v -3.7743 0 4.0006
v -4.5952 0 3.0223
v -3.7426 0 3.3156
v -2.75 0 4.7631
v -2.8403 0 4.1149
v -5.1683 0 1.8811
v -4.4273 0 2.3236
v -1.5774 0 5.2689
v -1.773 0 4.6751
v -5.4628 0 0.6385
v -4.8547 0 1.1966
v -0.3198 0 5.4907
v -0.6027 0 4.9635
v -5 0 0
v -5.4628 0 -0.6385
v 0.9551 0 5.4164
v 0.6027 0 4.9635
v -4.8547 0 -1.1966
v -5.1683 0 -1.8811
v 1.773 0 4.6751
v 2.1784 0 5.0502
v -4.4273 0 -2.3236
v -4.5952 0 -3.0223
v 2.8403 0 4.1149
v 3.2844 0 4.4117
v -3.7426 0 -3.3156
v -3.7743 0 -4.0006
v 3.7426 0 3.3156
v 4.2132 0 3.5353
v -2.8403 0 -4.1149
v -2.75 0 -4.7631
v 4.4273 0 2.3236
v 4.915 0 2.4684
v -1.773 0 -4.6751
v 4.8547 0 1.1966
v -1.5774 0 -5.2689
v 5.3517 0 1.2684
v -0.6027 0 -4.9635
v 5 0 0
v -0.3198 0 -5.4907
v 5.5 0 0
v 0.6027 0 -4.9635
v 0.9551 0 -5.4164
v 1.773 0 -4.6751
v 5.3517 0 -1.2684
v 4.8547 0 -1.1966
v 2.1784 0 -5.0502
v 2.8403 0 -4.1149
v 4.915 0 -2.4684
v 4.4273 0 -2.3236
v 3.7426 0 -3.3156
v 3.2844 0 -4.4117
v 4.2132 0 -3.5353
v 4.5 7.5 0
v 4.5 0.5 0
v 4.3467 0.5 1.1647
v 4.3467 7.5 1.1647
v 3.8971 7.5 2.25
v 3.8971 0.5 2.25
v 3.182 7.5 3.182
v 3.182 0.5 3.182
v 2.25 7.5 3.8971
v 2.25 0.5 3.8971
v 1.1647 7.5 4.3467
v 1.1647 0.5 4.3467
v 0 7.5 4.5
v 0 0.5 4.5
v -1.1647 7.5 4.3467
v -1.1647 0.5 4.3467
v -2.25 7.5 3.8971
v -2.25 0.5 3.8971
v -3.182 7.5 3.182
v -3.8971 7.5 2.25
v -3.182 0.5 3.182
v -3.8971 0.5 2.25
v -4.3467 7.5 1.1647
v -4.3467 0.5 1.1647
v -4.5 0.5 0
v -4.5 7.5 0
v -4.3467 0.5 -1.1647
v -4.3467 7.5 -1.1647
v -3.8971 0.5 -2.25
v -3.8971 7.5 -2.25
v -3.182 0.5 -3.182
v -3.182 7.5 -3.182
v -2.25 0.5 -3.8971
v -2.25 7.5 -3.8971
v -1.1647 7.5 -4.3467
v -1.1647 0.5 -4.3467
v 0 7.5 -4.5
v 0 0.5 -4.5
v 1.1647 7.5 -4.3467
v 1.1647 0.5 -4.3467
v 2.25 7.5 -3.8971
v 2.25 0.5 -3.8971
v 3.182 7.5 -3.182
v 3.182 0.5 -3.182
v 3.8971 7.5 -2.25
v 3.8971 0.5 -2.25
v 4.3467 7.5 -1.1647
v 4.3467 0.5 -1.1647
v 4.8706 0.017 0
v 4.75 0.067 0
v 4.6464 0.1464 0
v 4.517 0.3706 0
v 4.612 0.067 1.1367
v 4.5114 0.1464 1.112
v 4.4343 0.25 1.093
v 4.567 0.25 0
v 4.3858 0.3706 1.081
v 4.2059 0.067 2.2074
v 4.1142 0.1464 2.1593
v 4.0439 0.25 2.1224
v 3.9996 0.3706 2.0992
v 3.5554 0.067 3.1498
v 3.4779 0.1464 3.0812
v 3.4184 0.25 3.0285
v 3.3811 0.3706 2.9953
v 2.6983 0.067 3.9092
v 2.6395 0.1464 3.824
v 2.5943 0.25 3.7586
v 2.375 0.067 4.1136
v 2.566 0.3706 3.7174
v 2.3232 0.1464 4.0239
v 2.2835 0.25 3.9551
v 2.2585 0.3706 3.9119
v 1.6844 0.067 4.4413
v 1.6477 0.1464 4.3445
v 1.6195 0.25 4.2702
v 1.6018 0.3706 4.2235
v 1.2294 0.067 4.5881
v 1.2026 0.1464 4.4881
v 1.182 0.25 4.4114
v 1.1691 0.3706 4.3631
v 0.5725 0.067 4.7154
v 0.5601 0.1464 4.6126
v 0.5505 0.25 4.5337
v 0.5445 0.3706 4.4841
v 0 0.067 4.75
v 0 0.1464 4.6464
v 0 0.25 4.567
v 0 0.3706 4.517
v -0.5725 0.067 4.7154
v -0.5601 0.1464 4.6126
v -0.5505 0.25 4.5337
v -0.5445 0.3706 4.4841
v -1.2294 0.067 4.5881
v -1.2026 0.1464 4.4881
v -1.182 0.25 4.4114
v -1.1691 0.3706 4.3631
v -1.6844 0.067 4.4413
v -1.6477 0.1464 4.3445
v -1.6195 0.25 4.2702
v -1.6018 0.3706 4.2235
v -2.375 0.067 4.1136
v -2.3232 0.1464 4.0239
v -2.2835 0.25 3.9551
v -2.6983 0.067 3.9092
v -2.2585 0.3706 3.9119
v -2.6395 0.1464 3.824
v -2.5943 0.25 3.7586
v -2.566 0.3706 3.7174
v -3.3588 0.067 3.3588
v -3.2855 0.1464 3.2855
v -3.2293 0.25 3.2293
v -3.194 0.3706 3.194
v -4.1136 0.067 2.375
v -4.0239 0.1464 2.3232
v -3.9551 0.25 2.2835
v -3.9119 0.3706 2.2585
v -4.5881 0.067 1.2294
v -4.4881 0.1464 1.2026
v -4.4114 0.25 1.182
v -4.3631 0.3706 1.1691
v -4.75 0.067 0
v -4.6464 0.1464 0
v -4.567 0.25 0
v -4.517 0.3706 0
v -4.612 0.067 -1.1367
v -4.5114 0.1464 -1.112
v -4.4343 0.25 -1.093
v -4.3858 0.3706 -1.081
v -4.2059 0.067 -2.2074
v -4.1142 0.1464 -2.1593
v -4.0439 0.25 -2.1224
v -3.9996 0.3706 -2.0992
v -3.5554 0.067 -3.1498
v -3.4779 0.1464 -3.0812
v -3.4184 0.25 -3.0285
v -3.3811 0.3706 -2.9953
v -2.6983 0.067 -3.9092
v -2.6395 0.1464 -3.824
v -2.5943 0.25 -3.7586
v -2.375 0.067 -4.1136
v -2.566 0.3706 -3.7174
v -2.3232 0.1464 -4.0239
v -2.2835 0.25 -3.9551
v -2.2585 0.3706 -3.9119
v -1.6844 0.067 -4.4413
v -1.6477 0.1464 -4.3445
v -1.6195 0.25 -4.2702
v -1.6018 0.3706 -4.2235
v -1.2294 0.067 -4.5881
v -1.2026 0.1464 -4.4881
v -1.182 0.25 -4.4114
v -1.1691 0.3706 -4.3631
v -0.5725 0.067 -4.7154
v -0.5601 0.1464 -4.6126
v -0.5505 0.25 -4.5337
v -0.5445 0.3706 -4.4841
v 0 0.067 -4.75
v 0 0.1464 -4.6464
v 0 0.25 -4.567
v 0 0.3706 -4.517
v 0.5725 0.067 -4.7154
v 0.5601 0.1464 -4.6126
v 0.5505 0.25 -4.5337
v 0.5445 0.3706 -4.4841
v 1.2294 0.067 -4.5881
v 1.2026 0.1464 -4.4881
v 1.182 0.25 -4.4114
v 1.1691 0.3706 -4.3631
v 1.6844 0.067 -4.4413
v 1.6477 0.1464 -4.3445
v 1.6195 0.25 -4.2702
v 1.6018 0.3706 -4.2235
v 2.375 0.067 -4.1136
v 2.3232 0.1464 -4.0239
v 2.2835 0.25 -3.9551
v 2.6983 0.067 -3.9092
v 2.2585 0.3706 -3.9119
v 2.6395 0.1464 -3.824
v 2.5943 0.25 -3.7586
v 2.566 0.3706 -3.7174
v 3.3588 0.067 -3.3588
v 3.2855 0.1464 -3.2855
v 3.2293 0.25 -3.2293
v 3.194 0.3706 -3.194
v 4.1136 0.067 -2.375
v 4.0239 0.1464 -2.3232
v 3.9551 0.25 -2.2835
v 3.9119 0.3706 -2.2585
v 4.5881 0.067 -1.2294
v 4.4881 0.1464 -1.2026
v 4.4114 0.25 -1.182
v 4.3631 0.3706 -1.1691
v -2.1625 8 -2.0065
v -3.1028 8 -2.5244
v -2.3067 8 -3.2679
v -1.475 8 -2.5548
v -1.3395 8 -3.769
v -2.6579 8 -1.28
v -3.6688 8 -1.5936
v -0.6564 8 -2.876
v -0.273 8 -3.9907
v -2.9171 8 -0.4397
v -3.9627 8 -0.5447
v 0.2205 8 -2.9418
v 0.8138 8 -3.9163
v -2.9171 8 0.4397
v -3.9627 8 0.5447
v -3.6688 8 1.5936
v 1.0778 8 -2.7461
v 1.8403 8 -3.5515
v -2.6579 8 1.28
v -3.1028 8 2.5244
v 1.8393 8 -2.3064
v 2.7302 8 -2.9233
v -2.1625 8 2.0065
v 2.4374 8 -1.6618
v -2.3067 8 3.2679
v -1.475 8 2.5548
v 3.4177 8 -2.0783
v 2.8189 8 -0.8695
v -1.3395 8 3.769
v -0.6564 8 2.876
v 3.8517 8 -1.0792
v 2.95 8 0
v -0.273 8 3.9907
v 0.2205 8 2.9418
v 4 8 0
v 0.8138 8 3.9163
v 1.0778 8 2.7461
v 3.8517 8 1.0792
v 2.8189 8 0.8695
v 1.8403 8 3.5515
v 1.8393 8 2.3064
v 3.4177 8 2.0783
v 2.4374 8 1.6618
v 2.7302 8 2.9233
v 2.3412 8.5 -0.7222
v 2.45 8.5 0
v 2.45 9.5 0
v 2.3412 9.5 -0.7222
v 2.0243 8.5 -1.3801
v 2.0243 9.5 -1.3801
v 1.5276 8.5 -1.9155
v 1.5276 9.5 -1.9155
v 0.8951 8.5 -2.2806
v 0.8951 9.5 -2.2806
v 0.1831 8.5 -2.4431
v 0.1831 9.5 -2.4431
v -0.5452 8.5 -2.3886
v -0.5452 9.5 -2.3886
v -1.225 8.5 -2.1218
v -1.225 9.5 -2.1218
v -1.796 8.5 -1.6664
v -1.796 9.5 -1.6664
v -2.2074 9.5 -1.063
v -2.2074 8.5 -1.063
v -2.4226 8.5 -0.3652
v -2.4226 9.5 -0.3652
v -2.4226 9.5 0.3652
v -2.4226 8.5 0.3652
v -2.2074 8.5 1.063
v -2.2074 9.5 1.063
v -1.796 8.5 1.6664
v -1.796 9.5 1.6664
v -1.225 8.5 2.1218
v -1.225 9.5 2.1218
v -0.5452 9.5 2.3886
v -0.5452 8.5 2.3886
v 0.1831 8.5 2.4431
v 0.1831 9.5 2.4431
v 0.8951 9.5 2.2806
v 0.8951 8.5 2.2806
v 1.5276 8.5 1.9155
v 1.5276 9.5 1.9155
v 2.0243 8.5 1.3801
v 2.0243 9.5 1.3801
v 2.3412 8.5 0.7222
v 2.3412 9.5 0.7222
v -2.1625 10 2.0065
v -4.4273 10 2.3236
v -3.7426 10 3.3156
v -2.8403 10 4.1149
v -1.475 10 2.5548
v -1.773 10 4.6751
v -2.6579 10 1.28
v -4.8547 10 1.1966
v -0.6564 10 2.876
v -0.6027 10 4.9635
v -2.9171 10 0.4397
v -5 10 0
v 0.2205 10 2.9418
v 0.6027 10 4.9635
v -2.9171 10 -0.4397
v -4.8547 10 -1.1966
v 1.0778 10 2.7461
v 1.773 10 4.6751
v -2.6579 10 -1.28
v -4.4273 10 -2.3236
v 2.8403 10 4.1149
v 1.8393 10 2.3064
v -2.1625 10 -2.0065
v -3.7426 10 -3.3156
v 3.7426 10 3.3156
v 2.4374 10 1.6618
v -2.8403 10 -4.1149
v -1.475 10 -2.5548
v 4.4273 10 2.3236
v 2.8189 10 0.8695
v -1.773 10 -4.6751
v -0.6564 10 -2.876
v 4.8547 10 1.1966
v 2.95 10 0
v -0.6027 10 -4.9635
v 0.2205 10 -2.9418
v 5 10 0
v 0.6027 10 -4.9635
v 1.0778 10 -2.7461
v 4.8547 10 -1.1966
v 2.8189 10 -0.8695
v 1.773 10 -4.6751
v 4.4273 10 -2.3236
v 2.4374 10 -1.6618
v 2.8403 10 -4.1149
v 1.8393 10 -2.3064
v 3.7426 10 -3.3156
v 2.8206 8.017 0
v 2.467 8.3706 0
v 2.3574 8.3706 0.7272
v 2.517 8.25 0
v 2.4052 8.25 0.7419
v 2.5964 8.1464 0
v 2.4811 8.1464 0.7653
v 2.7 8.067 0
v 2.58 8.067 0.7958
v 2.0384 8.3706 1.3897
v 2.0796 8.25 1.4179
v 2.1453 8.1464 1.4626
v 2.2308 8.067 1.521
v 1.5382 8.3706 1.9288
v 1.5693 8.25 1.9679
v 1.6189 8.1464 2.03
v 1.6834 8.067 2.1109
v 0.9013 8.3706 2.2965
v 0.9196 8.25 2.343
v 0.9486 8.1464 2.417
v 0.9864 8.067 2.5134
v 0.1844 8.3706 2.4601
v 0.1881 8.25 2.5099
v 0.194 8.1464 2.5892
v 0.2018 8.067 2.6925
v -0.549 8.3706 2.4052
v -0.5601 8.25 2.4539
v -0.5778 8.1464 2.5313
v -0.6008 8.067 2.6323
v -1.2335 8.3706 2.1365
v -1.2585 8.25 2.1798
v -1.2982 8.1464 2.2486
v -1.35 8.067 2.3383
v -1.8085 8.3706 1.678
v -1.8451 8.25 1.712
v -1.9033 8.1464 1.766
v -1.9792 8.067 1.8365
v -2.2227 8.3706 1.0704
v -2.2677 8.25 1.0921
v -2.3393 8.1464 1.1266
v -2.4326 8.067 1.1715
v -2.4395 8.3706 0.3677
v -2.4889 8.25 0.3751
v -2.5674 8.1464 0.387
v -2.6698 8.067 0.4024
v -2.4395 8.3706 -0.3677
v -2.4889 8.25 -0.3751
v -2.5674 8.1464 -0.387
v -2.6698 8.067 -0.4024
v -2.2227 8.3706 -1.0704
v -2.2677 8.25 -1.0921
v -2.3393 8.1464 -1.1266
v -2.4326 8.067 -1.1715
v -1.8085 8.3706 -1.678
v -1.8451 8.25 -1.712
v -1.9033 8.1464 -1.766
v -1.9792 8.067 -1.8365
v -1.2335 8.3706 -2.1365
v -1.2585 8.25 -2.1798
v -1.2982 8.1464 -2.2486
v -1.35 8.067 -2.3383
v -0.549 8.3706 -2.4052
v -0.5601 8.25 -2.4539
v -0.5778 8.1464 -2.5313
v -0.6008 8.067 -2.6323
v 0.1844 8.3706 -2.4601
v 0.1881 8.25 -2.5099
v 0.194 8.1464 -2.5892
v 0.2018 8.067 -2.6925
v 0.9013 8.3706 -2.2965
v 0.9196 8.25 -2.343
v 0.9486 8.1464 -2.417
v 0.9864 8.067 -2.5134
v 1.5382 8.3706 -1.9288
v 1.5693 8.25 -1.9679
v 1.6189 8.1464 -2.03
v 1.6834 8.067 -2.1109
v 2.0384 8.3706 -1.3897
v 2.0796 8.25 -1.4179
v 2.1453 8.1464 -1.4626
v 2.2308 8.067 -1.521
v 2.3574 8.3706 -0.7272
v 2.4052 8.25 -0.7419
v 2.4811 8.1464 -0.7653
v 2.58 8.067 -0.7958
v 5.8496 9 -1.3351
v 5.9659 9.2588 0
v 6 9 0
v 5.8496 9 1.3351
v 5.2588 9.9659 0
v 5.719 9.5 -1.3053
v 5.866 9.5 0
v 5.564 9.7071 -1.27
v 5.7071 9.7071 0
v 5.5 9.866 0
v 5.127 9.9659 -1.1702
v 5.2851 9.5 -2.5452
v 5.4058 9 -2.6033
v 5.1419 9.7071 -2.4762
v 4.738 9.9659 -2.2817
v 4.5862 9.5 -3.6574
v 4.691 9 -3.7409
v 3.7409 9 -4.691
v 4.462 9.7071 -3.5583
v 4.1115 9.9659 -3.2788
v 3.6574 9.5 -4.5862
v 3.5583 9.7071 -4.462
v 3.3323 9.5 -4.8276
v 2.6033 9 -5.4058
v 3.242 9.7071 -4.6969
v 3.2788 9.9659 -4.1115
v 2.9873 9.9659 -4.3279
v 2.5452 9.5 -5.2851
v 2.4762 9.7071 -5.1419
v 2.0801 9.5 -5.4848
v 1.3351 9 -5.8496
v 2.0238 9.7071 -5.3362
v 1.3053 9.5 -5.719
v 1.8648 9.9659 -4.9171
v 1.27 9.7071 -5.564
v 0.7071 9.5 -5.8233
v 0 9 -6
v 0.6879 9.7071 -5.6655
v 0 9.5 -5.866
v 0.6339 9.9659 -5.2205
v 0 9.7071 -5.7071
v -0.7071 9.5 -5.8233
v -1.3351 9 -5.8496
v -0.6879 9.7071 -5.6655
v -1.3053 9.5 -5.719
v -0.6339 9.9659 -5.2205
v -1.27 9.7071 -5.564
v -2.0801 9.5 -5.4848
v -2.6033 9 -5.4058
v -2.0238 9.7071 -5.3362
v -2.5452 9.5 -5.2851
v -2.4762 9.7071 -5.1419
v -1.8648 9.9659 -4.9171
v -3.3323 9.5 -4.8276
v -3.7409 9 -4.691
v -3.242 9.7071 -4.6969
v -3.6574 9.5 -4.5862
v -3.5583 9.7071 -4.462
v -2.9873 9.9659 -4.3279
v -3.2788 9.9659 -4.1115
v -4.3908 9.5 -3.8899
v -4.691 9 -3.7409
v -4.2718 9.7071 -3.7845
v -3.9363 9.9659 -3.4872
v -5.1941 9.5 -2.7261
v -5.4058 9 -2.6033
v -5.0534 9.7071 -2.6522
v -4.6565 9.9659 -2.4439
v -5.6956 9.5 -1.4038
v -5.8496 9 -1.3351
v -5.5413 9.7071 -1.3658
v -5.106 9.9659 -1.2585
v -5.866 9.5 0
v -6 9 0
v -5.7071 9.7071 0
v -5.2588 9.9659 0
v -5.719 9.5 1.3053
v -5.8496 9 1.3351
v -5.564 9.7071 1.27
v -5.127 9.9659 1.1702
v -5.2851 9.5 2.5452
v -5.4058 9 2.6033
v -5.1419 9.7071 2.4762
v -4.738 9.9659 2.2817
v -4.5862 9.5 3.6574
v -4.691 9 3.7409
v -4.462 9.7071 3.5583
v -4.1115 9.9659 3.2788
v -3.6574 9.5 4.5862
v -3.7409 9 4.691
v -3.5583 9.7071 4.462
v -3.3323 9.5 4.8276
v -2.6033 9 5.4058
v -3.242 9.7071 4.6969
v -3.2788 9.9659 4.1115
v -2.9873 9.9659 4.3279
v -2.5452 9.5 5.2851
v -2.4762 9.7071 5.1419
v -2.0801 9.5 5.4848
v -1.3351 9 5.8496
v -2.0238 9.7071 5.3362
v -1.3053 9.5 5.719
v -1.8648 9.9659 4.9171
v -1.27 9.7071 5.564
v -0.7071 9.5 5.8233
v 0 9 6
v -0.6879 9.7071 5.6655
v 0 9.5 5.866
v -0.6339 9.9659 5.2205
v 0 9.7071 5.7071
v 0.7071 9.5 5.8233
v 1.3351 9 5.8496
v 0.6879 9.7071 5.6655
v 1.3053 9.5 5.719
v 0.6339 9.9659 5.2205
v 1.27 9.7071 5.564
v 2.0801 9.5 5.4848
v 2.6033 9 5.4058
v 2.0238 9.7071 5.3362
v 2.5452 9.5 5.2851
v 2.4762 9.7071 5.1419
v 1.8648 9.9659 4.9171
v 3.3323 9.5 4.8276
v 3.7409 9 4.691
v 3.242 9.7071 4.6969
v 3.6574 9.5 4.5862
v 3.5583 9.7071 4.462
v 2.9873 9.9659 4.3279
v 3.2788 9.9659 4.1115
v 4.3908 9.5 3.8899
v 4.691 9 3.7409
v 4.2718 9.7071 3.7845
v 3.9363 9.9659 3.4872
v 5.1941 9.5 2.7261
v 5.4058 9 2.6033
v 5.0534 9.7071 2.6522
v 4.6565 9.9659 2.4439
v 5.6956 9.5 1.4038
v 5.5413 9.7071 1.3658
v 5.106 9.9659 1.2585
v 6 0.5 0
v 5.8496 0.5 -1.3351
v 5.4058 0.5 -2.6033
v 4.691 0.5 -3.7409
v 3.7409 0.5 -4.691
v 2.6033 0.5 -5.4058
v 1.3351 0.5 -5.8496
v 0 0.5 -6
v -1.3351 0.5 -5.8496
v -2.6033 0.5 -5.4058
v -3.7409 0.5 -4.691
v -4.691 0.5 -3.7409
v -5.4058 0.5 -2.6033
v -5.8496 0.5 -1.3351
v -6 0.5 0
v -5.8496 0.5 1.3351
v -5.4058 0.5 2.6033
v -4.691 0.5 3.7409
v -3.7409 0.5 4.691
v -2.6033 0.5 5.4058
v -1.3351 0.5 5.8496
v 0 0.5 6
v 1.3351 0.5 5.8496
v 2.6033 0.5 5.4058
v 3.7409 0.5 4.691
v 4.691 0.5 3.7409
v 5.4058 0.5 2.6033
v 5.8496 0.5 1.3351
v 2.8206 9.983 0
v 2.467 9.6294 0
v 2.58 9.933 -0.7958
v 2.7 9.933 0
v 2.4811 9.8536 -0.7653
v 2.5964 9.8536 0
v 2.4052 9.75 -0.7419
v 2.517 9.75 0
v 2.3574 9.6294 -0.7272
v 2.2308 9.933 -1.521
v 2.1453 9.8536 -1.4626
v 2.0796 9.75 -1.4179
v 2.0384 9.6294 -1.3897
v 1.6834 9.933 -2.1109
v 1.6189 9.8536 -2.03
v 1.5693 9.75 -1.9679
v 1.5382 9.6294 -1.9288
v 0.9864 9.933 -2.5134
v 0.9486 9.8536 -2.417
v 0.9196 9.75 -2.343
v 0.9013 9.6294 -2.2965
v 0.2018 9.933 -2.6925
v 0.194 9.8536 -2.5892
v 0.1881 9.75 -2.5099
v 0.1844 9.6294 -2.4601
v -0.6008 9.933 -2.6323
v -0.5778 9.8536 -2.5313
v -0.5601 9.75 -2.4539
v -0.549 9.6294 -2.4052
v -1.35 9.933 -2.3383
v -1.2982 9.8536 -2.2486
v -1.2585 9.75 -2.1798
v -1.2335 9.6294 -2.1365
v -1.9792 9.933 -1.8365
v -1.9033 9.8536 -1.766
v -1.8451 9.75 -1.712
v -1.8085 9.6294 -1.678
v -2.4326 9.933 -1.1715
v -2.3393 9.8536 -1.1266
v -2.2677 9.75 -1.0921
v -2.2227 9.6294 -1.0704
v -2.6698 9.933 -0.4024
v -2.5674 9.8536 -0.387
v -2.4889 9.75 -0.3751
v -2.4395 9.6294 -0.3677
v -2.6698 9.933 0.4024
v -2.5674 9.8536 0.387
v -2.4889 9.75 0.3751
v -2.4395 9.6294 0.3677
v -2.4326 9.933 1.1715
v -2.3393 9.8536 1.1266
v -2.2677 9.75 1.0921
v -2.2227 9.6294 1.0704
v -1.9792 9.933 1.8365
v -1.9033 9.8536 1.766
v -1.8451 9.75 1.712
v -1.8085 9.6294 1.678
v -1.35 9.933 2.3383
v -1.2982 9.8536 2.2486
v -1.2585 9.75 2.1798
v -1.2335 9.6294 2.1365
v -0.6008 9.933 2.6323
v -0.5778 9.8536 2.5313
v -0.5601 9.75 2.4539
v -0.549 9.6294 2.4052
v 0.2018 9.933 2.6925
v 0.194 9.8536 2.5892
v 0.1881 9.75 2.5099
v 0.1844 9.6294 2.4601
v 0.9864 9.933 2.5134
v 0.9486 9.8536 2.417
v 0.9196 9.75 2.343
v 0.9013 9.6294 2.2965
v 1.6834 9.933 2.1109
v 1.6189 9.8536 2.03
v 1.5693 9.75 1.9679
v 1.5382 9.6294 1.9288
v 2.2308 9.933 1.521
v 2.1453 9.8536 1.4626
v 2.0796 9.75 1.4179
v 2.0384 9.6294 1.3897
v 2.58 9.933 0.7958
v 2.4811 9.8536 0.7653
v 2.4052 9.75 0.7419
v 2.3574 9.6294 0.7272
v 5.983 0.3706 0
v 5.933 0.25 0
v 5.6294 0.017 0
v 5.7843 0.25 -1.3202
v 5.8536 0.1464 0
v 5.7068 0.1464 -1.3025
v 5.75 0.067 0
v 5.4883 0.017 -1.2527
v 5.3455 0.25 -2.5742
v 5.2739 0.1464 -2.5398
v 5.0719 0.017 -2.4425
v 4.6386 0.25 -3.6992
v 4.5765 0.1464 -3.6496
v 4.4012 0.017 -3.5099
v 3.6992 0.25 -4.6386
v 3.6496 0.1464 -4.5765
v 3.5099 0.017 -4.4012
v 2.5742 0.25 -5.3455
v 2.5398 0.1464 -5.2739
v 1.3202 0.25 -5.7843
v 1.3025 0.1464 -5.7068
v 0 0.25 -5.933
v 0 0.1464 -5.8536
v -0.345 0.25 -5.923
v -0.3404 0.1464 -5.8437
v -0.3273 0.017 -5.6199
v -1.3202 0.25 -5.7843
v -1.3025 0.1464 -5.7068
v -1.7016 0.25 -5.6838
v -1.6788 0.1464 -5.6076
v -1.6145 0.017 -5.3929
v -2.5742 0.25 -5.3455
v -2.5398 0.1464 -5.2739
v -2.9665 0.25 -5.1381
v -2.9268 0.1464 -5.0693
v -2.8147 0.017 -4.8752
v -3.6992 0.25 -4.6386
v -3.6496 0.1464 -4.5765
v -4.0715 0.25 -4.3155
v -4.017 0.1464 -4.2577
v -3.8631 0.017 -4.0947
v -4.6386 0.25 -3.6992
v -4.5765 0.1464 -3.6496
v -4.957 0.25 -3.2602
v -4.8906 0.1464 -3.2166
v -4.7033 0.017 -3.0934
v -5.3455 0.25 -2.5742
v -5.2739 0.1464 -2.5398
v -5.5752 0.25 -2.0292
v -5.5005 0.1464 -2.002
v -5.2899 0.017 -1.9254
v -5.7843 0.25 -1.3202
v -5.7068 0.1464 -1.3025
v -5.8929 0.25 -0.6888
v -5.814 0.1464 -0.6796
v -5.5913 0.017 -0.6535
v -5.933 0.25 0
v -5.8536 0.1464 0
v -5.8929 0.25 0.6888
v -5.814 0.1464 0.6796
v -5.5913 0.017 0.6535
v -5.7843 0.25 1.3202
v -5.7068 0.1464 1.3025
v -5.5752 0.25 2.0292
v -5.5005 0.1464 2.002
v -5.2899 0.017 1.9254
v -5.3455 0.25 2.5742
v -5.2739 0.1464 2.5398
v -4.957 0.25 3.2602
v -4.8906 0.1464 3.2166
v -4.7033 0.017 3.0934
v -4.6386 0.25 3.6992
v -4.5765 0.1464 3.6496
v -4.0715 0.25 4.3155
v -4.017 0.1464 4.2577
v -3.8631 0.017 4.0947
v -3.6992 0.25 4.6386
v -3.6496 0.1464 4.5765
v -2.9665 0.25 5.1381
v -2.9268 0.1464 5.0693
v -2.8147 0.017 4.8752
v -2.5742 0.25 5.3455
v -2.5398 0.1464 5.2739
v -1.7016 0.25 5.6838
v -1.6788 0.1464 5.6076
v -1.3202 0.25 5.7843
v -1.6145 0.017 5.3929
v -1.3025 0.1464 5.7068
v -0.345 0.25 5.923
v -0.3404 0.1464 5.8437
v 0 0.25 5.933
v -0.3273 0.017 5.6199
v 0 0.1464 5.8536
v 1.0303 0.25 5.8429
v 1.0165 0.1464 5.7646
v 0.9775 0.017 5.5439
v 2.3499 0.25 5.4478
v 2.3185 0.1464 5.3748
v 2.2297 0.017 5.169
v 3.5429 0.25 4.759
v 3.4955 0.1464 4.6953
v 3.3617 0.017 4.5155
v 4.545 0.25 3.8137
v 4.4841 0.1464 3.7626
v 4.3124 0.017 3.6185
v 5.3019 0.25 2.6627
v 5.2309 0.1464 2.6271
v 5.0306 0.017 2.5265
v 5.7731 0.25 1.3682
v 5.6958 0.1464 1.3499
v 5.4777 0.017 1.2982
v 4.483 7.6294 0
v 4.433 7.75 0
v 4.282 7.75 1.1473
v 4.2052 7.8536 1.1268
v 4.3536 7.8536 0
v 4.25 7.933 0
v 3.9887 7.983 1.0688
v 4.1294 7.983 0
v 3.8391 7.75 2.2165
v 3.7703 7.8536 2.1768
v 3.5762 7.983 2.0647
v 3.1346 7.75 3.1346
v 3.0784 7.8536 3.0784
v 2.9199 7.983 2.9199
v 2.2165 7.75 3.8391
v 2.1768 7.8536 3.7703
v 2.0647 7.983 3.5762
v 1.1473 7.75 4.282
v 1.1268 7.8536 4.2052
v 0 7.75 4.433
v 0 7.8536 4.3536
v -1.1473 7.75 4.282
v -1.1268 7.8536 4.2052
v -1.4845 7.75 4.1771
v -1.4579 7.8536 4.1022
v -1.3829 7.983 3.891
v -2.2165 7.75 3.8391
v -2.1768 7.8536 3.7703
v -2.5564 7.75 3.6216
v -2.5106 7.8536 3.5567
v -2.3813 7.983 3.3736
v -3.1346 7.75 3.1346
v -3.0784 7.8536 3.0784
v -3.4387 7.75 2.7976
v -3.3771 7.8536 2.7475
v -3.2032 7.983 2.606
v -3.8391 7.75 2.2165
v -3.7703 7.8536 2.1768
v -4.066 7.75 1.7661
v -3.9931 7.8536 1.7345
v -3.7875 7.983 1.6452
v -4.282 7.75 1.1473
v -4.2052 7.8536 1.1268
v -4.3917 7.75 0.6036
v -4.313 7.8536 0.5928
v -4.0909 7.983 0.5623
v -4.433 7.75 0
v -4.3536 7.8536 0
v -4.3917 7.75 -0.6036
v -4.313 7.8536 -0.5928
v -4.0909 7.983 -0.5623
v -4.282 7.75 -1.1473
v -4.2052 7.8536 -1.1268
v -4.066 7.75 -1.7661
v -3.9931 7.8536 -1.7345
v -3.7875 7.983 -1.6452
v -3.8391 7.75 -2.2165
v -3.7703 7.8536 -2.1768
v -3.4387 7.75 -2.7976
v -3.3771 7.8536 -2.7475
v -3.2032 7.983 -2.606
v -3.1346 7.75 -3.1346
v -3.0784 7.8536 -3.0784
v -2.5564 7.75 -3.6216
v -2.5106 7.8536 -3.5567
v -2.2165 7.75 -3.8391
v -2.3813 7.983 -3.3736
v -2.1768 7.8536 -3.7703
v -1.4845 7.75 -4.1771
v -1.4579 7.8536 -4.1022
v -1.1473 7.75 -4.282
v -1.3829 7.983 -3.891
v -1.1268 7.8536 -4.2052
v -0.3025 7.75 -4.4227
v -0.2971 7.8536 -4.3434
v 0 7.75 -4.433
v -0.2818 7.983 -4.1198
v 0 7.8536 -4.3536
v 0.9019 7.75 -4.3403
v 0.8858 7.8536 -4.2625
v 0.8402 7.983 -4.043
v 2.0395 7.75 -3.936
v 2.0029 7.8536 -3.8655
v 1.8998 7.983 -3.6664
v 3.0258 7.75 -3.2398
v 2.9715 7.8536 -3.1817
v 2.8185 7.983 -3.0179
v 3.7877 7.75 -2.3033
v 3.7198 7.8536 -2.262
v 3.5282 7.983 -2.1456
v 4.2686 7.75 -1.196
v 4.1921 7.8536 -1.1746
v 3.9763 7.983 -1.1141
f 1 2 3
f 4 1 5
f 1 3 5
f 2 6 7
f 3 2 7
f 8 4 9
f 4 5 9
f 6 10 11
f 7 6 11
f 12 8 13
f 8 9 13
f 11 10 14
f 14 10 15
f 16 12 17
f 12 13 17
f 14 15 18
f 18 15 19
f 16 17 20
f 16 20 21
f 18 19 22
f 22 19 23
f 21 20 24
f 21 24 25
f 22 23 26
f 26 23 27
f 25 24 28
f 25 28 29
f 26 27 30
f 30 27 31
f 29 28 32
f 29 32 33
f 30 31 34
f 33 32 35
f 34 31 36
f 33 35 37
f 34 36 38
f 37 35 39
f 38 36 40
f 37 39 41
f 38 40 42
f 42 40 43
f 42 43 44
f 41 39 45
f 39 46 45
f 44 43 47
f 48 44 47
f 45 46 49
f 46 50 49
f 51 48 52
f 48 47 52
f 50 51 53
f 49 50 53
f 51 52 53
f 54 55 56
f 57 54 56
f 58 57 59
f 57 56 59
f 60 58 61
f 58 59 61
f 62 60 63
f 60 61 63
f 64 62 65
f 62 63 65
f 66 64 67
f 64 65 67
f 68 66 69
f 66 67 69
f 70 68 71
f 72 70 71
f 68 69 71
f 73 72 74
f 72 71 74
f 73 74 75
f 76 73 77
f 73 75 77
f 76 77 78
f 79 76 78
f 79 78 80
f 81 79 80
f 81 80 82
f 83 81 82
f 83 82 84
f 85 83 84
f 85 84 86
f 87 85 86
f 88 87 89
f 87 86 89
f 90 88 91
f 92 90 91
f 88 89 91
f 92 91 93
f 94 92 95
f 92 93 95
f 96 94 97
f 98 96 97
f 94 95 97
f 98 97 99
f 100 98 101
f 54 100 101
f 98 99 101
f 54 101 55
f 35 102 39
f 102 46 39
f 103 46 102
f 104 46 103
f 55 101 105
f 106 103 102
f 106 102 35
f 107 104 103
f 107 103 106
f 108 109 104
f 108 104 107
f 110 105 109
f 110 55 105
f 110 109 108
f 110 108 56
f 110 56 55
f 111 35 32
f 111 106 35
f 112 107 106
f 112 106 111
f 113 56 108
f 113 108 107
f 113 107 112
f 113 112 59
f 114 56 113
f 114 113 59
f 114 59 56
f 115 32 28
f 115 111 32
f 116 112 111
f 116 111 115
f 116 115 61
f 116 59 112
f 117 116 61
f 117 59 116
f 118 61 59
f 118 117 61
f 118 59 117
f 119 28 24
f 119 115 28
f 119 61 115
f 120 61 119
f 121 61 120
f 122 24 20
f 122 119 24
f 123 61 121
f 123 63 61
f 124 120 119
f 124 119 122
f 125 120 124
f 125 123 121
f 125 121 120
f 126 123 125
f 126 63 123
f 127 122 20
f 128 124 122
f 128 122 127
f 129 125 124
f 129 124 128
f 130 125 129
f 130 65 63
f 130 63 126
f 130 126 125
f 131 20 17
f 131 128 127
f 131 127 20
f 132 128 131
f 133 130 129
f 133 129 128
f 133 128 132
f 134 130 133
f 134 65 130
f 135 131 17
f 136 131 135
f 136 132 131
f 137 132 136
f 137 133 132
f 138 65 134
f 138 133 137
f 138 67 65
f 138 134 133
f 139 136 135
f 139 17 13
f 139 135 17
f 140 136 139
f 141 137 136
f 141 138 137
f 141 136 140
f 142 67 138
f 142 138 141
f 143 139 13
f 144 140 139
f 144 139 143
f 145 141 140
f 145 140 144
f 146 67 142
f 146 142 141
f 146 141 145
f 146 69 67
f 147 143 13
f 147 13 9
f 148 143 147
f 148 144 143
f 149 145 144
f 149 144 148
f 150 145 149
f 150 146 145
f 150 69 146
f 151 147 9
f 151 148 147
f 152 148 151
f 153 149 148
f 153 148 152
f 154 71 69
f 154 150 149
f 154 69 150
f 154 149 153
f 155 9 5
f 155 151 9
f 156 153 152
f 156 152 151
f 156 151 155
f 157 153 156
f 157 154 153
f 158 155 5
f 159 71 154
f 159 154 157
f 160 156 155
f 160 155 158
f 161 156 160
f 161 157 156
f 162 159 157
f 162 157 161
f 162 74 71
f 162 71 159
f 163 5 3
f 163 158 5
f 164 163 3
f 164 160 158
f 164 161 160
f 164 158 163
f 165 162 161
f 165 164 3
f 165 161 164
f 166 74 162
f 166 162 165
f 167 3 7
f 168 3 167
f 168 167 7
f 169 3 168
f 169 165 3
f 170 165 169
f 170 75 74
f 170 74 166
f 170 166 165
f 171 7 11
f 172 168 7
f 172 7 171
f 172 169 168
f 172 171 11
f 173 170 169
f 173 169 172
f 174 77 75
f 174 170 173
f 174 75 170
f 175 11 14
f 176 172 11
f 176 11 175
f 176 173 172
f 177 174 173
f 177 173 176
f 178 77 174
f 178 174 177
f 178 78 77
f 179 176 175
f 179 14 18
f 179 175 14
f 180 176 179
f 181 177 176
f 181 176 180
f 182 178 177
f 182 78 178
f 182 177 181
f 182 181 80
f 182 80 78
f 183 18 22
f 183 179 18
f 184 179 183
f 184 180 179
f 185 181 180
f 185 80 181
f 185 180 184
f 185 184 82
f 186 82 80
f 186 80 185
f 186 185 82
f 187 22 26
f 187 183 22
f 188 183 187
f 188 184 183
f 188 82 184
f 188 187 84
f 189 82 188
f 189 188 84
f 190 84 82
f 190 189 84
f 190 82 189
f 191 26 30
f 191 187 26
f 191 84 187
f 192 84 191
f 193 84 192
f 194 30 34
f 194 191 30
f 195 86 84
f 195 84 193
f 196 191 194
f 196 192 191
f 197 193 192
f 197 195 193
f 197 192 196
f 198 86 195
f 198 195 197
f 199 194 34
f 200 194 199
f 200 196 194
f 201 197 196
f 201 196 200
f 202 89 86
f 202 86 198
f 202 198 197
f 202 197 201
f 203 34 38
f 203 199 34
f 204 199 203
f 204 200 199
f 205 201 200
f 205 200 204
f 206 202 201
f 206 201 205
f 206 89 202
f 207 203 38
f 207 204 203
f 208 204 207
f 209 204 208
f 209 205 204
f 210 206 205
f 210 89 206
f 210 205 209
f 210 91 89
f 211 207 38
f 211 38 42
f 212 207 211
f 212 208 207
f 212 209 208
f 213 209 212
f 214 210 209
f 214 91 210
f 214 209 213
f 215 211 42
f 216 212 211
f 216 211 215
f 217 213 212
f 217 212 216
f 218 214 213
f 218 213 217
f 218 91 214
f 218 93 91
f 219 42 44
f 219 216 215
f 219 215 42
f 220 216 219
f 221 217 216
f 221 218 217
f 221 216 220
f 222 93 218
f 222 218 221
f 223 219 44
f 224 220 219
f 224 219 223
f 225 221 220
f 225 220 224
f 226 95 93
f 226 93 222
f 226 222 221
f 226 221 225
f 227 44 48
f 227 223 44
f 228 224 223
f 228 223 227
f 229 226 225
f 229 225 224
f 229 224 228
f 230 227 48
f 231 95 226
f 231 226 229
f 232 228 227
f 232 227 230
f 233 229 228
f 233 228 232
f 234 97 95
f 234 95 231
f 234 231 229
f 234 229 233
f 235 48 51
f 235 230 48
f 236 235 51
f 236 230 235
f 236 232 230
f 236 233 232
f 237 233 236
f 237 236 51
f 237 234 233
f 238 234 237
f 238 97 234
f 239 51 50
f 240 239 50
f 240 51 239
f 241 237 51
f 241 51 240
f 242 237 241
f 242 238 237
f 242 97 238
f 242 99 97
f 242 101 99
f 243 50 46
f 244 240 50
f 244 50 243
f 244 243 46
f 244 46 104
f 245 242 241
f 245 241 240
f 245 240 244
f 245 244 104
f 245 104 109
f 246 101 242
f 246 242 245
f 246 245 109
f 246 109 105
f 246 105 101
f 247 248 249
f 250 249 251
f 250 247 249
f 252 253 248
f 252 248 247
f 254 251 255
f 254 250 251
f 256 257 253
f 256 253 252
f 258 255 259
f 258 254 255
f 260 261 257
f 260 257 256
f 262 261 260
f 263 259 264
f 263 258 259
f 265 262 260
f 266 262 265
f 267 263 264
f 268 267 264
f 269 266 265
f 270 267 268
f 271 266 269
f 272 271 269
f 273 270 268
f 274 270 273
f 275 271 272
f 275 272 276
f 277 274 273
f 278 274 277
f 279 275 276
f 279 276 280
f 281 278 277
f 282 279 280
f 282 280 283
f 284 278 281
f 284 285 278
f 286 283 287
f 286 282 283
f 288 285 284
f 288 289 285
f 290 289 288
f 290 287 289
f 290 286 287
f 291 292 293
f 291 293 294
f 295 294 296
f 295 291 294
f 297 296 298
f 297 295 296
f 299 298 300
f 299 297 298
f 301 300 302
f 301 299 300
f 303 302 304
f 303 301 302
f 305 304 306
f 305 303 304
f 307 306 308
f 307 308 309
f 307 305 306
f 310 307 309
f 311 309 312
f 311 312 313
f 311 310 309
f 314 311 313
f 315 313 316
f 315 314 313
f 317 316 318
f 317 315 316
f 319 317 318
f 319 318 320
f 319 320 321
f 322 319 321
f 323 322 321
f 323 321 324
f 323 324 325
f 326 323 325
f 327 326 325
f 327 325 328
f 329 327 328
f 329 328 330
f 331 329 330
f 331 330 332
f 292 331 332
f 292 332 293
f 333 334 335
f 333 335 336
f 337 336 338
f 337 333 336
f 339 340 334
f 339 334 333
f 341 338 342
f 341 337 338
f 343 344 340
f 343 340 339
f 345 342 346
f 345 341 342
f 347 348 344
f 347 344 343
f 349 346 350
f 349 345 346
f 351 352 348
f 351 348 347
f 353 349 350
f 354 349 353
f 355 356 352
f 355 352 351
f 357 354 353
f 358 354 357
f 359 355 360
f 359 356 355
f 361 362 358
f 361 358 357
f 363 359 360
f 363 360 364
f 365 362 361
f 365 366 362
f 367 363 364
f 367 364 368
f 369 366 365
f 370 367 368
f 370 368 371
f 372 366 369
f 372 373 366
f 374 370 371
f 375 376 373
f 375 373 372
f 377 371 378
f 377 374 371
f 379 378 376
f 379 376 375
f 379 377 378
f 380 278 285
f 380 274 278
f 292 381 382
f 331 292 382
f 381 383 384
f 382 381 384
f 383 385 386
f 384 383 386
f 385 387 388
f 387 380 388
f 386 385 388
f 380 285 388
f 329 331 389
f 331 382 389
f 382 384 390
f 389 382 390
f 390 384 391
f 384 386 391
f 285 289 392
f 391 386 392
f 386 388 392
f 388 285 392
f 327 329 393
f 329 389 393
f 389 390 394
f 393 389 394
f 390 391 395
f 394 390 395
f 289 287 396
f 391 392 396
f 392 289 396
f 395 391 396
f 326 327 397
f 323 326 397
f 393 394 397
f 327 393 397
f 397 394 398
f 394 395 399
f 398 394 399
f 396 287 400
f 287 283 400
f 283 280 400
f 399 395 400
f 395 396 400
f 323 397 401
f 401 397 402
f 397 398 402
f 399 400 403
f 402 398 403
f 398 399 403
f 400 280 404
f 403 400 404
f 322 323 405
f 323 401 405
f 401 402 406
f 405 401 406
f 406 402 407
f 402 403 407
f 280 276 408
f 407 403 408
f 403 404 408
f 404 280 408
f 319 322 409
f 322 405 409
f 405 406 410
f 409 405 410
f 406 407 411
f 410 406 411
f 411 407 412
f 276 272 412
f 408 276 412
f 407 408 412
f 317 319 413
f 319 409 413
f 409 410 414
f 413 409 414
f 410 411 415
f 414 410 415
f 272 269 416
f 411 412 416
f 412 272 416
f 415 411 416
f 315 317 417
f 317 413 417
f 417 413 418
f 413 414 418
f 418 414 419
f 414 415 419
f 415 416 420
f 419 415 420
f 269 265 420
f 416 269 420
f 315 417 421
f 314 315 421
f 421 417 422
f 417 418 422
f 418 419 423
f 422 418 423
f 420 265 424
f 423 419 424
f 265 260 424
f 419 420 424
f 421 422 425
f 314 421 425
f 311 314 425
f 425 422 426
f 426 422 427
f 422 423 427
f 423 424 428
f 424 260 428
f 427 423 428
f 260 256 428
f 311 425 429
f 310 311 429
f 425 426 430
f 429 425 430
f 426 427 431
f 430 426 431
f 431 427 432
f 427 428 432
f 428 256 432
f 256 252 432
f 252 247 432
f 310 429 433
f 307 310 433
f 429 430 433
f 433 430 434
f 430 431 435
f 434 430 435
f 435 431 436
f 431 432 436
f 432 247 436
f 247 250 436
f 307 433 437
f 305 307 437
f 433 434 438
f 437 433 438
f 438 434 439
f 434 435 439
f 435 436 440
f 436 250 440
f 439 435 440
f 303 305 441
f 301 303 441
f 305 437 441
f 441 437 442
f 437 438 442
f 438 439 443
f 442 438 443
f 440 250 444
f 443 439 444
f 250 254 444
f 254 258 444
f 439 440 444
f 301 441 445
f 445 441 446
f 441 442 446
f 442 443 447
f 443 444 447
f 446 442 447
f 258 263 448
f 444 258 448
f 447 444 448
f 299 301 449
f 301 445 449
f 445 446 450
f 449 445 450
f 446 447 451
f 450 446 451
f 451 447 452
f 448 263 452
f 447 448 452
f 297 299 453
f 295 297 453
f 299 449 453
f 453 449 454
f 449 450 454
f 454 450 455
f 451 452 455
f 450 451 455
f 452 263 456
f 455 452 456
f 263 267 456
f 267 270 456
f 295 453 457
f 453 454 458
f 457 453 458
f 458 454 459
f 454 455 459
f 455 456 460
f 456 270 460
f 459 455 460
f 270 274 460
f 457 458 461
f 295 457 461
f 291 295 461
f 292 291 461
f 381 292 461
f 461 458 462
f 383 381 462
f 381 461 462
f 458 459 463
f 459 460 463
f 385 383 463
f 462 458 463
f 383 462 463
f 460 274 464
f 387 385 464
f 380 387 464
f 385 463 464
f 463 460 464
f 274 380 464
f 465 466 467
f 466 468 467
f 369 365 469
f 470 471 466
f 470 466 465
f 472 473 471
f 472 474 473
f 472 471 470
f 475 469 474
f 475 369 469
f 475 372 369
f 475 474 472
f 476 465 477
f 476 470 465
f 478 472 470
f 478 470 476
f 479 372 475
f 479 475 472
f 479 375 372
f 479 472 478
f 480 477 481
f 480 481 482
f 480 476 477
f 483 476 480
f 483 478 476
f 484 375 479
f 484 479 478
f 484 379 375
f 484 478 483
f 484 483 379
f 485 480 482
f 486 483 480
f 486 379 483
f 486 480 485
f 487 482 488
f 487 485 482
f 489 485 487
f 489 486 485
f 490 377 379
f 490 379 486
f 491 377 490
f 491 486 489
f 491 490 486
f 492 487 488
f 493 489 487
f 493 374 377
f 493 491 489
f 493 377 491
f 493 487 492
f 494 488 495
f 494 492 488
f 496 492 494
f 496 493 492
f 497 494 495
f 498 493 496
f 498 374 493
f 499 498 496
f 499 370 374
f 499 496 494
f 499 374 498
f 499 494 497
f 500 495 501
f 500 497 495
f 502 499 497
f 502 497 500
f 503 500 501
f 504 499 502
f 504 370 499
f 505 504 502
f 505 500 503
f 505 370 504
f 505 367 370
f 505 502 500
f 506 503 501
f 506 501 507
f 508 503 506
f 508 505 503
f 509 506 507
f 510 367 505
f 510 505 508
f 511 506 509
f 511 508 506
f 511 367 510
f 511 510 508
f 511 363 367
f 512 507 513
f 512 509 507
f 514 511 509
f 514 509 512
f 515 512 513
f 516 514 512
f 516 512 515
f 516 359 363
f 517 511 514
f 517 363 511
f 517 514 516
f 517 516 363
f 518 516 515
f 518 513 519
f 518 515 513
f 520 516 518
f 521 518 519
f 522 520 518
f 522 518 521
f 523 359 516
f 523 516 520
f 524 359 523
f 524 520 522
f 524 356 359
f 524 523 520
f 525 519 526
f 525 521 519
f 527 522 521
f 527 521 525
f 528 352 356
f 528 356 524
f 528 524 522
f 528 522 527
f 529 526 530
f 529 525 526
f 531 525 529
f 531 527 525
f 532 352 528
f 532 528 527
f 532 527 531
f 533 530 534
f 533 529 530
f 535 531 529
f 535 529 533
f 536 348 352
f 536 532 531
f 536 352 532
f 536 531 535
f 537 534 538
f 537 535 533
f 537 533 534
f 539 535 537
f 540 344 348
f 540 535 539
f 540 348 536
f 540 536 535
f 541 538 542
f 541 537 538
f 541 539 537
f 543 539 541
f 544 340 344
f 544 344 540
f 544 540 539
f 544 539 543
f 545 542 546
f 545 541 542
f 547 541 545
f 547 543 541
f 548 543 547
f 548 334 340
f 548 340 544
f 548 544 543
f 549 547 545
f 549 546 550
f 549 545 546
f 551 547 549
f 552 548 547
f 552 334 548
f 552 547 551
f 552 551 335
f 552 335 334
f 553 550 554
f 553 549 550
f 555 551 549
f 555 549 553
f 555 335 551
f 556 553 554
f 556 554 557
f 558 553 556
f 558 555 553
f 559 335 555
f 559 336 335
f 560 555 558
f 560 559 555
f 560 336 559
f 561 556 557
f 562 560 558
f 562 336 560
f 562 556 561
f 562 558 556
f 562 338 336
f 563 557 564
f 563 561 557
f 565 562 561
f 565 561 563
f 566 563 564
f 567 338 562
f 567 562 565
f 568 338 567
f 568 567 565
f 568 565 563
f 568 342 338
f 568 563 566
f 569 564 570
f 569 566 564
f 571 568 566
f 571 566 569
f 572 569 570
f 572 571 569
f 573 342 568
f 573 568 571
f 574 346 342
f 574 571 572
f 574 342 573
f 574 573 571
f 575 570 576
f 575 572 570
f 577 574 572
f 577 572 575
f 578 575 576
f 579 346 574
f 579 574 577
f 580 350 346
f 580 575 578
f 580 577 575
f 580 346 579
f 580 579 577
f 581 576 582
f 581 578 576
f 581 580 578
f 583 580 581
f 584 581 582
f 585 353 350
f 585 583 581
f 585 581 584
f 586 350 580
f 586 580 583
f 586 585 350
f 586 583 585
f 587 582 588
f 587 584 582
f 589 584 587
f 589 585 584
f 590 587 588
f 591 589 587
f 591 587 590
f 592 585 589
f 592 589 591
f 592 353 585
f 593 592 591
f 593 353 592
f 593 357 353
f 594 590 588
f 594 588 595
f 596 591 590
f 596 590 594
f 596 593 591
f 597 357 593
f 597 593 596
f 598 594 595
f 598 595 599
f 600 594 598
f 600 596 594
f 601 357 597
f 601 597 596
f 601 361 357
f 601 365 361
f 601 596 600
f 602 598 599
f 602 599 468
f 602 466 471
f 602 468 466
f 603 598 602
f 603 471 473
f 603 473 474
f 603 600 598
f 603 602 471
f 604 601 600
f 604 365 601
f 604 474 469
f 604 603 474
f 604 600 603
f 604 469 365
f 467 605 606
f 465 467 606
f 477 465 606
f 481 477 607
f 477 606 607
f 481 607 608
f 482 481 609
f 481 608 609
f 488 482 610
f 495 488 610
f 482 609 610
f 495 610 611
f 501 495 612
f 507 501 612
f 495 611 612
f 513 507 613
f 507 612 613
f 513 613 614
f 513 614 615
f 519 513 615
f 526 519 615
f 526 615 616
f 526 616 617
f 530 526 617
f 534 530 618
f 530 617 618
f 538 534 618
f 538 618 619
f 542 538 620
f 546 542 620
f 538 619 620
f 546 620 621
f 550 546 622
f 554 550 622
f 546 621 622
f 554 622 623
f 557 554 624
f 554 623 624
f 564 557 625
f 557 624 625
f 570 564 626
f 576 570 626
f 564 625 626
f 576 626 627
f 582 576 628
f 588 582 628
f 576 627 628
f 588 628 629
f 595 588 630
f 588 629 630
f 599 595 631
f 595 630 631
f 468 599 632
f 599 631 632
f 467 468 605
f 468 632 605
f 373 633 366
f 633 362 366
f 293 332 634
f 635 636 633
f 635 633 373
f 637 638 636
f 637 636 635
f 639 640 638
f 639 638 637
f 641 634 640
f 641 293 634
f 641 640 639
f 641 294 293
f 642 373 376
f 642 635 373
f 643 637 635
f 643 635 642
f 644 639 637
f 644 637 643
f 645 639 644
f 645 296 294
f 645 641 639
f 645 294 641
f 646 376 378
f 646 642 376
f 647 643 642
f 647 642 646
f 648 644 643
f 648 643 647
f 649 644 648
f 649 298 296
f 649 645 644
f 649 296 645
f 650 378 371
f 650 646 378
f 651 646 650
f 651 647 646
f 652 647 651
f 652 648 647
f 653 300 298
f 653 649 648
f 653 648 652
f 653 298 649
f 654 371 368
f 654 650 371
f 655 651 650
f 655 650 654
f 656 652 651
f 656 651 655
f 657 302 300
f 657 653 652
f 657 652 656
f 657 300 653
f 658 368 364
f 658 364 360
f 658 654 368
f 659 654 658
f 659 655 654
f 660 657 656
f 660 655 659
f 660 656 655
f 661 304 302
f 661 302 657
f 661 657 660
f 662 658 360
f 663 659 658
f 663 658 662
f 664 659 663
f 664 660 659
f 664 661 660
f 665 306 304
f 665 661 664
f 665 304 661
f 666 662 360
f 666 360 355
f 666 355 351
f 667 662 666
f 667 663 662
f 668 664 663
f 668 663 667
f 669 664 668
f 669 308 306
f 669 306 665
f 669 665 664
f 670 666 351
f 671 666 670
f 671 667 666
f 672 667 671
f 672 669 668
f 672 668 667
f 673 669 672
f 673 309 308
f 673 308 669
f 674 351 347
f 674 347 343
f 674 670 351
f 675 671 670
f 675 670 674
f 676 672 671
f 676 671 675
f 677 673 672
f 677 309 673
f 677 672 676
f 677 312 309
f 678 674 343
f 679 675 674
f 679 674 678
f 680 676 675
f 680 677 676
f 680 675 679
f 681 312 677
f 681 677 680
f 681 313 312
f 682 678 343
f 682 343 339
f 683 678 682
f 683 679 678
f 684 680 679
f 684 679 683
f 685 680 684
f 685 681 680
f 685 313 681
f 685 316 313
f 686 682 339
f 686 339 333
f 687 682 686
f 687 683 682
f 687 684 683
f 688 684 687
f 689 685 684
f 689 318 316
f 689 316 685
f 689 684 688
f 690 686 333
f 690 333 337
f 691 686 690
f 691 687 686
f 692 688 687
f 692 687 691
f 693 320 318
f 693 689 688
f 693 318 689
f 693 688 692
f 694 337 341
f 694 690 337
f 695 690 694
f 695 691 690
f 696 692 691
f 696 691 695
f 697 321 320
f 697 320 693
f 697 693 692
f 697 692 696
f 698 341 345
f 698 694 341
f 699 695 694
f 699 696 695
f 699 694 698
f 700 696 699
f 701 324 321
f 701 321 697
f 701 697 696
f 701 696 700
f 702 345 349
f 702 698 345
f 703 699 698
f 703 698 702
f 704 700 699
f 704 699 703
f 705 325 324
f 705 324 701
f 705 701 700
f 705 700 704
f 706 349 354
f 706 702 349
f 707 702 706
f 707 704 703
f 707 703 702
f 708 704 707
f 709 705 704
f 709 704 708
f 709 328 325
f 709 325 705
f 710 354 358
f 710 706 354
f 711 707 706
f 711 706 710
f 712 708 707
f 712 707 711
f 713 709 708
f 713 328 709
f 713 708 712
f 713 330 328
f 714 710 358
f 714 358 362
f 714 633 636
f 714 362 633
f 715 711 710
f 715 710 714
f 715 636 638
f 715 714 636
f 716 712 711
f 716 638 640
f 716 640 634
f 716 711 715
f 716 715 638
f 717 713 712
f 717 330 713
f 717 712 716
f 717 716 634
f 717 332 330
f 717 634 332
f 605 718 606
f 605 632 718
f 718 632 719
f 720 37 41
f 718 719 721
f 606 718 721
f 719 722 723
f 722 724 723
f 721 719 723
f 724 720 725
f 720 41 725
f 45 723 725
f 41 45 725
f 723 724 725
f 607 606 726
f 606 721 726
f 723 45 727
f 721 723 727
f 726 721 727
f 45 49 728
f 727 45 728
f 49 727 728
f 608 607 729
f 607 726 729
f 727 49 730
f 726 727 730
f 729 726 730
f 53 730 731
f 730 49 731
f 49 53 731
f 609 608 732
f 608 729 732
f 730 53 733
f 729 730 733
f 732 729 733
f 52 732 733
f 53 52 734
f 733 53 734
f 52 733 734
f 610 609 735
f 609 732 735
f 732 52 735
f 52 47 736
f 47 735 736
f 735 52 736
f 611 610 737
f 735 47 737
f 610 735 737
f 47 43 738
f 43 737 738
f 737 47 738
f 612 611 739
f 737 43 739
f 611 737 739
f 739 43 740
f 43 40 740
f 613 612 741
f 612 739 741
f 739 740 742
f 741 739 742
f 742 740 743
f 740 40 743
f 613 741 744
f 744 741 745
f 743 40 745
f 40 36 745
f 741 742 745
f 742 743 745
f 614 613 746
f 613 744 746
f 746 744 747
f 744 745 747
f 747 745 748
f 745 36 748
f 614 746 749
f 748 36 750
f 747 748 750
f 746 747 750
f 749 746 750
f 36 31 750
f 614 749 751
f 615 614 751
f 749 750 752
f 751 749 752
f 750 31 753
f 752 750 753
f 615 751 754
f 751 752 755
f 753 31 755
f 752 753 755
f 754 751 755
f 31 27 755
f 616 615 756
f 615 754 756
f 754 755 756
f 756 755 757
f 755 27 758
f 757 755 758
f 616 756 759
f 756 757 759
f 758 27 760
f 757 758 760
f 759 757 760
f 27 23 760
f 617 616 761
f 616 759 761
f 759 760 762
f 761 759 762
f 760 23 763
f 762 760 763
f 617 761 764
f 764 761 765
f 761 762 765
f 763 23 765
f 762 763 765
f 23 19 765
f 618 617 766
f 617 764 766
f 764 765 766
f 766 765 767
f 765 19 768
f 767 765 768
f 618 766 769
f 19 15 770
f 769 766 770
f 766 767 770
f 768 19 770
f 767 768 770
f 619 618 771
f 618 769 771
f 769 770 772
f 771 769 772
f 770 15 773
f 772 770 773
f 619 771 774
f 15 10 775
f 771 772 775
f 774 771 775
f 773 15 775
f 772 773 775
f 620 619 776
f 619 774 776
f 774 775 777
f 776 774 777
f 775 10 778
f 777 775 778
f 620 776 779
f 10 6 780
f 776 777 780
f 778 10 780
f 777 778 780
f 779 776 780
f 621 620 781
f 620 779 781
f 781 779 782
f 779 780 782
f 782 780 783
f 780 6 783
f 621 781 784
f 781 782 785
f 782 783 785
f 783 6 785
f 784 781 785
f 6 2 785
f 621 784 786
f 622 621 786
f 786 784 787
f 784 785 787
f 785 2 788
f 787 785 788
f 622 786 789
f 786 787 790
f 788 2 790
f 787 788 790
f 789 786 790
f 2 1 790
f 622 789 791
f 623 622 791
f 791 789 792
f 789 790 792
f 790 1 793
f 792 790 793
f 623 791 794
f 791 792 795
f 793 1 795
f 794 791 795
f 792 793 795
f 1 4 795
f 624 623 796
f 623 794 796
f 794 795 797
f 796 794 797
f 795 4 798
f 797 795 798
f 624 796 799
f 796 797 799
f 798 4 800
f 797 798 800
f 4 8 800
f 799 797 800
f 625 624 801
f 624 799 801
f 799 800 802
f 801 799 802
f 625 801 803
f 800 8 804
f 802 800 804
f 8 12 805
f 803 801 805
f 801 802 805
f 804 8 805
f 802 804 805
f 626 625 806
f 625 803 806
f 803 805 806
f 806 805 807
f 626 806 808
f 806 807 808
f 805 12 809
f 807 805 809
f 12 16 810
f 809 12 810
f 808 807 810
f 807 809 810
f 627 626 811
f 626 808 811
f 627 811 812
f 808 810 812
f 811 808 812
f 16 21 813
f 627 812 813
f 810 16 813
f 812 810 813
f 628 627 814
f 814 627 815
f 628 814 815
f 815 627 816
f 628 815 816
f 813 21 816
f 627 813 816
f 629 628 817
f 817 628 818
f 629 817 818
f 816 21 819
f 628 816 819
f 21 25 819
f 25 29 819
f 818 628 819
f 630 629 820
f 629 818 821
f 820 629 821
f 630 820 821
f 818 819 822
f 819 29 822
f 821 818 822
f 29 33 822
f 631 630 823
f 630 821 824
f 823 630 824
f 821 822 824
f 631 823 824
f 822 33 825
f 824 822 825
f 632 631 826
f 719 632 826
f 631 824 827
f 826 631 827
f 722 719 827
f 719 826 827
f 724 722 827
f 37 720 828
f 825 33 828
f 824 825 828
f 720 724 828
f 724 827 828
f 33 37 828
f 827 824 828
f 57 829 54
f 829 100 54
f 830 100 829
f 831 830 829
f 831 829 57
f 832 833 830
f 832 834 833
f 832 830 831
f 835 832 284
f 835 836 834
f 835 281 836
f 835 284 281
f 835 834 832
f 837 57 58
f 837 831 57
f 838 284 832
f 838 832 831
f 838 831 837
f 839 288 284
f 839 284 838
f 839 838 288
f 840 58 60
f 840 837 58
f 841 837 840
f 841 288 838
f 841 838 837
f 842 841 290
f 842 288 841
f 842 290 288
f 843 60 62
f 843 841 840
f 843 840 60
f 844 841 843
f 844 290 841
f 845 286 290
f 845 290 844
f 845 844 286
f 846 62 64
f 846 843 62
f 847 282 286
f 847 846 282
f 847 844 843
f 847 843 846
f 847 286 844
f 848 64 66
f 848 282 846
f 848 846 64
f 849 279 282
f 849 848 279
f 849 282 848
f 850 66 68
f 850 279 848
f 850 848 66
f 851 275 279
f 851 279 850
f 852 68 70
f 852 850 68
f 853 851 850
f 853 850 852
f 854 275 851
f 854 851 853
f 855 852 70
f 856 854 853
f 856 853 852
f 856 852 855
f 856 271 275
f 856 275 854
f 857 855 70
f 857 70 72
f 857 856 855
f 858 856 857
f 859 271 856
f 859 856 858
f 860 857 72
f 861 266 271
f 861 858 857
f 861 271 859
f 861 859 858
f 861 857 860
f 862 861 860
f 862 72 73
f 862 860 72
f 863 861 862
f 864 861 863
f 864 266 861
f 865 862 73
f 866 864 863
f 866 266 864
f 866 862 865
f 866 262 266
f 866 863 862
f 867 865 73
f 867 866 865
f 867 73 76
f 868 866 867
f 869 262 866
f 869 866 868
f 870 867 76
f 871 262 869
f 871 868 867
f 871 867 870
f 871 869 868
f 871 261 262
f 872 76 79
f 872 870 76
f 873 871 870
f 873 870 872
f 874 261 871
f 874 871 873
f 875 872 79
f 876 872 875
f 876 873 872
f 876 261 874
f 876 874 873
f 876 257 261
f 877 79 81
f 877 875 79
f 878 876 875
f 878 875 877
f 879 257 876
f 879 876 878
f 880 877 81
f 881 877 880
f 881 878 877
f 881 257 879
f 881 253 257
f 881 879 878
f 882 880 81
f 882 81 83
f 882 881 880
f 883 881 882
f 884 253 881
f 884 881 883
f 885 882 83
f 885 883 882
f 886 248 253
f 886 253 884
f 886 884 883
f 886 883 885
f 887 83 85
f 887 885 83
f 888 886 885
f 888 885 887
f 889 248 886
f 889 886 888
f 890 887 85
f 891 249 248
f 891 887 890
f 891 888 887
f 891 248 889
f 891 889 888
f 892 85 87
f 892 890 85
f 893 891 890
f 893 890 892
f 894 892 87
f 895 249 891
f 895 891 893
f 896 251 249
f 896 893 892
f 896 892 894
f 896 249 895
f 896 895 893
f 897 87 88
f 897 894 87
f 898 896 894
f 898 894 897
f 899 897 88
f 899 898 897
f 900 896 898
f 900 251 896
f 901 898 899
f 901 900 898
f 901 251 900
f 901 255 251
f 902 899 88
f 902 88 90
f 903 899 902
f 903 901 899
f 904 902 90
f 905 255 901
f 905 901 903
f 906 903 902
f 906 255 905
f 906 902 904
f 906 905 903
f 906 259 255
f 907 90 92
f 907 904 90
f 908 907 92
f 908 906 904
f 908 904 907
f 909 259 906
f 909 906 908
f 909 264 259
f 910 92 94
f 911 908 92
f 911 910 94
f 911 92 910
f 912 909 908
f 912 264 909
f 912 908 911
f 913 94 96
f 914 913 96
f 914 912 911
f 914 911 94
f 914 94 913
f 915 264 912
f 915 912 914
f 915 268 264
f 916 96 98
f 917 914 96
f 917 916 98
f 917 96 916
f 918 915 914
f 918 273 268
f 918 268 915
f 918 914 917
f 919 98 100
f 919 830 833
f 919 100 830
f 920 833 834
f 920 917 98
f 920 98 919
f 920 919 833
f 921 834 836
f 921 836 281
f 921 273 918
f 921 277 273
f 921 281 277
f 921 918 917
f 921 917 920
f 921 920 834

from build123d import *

# Parameters (mm, degrees)
SKETCH_5_R          = 6
SKETCH_5_R_2        = 2.45
EXTRUDE_1_DEPTH     = 10
SKETCH_7_R          = 4.5
CUT_EXTRUDE_1_DEPTH = 8
FILLET_1_R          = 1
FILLET_2_R          = 0.5


with BuildPart() as part:
    # 草图5 → 凸台-拉伸1 (new body)
    with BuildSketch(Plane(origin=(0, 0, 0), x_dir=(1, 0, 0), z_dir=(0, 1, 0))):
        Circle(SKETCH_5_R)
        Circle(SKETCH_5_R_2, mode=Mode.SUBTRACT)
    extrude(amount=EXTRUDE_1_DEPTH)

    # 草图7 → 切除-拉伸1 (cut)
    with BuildSketch(Plane.XZ):
        Circle(SKETCH_7_R)
    extrude(amount=-CUT_EXTRUDE_1_DEPTH, mode=Mode.SUBTRACT)

    # 圆角1
    fillet_1_edges = [part.edges().sort_by_distance(p)[0] for p in [
        (-6, 10, 0),
    ]]
    fillet(fillet_1_edges, radius=FILLET_1_R)

    # 圆角2
    fillet_2_edges = [part.edges().sort_by_distance(p)[0] for p in [
        (-4.5, 8, 0),
        (-2.45, 8, 0),
        (-4.5, 0, 0),
        (-6, 0, 0),
        (-2.45, 10, 0),
    ]]
    fillet(fillet_2_edges, radius=FILLET_2_R)


solid = part.part
